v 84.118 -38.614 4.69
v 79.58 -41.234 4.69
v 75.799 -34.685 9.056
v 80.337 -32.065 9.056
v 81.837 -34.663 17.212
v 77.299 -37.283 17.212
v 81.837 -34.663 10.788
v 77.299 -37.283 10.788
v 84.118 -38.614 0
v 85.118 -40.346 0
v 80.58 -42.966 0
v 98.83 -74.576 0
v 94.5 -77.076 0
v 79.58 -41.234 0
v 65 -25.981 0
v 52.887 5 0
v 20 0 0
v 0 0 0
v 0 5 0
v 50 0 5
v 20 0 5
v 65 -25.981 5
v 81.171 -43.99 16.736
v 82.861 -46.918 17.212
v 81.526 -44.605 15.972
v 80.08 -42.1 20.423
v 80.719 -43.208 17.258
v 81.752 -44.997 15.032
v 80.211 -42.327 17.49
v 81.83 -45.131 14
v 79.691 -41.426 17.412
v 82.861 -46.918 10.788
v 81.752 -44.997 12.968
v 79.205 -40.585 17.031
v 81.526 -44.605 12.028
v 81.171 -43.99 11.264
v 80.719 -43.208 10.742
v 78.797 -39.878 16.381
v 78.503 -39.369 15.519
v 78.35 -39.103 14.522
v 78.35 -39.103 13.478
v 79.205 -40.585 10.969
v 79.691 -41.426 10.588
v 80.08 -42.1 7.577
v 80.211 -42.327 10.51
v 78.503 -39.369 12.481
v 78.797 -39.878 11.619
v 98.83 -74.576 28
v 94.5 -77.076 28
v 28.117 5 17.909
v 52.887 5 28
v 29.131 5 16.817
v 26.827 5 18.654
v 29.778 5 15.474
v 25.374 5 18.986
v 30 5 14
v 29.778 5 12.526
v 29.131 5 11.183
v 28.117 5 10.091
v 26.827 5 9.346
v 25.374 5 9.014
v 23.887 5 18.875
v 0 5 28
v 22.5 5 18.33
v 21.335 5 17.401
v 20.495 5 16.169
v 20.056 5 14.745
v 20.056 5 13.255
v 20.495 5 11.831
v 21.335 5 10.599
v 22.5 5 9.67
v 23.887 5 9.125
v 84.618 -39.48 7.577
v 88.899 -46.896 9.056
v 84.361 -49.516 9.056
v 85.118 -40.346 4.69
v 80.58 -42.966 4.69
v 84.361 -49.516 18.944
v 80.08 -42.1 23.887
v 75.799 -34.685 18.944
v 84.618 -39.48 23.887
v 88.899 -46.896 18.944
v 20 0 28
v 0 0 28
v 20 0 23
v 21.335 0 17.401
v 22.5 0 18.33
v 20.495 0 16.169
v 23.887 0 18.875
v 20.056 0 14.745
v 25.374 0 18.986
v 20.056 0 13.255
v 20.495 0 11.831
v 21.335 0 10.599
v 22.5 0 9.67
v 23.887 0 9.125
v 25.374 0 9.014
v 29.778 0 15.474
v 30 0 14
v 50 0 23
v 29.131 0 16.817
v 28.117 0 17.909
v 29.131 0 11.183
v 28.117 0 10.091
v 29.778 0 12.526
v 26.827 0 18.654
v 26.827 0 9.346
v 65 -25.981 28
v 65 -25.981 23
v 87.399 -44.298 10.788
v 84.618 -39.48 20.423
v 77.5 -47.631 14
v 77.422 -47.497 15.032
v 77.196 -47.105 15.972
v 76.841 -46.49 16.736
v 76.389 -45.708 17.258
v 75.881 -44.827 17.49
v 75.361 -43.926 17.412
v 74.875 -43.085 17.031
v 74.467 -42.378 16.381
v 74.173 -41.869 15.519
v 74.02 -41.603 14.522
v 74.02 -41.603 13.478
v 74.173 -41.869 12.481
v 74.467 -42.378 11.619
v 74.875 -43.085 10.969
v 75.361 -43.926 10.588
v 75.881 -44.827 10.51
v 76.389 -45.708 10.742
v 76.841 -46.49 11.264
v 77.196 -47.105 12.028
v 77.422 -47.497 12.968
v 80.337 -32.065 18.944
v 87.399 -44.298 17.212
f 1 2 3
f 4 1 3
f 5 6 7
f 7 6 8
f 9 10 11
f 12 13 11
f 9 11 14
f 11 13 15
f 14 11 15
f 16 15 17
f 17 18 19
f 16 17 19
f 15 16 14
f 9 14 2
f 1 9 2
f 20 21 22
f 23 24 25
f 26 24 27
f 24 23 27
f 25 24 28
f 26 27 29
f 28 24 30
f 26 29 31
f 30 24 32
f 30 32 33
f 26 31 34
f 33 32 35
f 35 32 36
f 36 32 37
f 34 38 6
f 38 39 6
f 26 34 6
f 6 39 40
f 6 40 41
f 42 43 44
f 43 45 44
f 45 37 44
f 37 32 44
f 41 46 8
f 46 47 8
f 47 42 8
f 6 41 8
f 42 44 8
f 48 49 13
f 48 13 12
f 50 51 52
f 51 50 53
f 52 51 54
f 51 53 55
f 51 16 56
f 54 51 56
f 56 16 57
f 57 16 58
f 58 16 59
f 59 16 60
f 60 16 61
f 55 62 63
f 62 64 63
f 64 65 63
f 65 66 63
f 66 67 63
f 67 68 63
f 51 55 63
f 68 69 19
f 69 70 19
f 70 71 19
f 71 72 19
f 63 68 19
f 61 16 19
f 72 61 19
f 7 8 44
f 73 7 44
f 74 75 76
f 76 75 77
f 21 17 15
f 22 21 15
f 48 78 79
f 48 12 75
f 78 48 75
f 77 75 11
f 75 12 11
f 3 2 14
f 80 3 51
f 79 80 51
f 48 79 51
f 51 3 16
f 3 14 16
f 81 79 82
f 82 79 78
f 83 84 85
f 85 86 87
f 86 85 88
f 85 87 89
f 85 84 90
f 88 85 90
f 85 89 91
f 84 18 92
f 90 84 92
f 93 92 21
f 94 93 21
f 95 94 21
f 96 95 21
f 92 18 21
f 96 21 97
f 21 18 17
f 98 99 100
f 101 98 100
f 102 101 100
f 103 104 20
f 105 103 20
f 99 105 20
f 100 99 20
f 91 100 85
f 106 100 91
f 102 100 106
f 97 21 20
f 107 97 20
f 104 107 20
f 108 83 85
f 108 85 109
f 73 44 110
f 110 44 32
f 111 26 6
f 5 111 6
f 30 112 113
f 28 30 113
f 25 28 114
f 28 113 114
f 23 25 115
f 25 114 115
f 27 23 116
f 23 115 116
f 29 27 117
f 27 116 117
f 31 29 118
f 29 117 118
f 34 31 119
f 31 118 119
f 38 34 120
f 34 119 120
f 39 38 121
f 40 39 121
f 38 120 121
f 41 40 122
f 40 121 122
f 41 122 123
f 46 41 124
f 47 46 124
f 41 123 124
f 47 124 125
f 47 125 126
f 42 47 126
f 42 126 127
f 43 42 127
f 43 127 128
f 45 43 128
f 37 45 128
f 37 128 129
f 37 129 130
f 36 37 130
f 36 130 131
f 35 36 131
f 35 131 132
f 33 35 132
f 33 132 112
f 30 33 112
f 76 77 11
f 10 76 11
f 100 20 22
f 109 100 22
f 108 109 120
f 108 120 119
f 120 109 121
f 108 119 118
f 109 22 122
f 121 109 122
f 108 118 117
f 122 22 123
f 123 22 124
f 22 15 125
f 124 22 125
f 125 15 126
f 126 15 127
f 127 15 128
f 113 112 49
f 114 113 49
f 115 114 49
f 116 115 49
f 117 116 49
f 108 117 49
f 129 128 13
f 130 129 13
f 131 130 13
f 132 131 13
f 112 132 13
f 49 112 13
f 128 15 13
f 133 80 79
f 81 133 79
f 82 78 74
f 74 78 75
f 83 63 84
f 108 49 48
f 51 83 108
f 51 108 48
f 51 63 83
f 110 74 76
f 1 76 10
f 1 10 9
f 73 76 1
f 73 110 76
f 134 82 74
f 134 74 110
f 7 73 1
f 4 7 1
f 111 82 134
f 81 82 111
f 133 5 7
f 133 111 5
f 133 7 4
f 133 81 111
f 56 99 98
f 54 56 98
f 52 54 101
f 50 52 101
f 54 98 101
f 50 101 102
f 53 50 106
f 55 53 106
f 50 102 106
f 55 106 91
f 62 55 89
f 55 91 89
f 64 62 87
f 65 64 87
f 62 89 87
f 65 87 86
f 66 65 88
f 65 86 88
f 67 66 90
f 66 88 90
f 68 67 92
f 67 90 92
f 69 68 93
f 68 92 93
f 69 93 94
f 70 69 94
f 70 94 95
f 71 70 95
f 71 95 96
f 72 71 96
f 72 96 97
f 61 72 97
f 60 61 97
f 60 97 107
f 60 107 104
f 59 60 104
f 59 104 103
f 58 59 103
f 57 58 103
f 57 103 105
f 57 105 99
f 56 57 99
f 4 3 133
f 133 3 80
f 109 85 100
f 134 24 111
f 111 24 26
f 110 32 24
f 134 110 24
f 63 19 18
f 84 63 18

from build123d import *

# Parameters (mm, degrees)
F1_DEPTH  = 28
F2_R      = 5
F3_DEPTH  = 5.001
F4_R      = 3.5
F5_DEPTH  = 44.7891304684
F7_DEPTH  = 5
F9_DEPTH  = 5
F11_DEPTH = 5.24
F13_DEPTH = 5.24


with BuildPart() as f1:
    # F0 (on Top) → F1 (new body)
    with BuildSketch(Plane.XY):
        Polygon((52.8867513459, 5), (0, 5), (0, 0), (50, 0), (94.5, -77.0762609368), (98.8301270189, -74.5762609368), align=None)
    extrude(amount=F1_DEPTH)

    # F2 (on face) → F3 (cut, through all)
    with BuildSketch(Plane.XZ):
        with Locations((25, 14)):
            Circle(F2_R)
    extrude(amount=-F3_DEPTH, mode=Mode.SUBTRACT)

    # F4 (on face) → F5 (cut, through all)
    with BuildSketch(Plane(origin=(37.5, 21.6506350946, 0), x_dir=(0.5, -0.8660254038, 0), z_dir=(-0.8660254038, -0.5, 0))):
        with Locations((76.5, 14)):
            Circle(F4_R)
    extrude(amount=-F5_DEPTH, mode=Mode.SUBTRACT)

    # F6 (on Top) → F7 (join)
    with BuildSketch(Plane.XY):
        Polygon((50, 0), (20, 0), (65, -25.9807621135), align=None)
    extrude(amount=F7_DEPTH)

    # F8 (on face) → F9 (join)
    with BuildSketch(Plane.XY.offset(28)):
        Polygon((65, -25.9807621135), (50, 0), (20, 0), align=None)
    extrude(amount=-F9_DEPTH)

    # F10 (on face) → F11 (join)
    with BuildSketch(Plane(origin=(41.8301270189, 24.1506350946, 0), x_dir=(-0.5, 0.8660254038, 0), z_dir=(0.8660254038, 0.5, 0))):
        Polygon((-85.0626, 18.943619415), (-85.0626, 9.056380585), (-76.5, 4.1127611701), (-67.9374, 9.056380585), (-67.9374, 18.943619415), (-76.5, 23.8872388299), align=None)
        Polygon((-76.5, 20.4231372148), (-70.9374, 17.2115686074), (-70.9374, 10.7884313926), (-76.5, 7.5768627852), (-82.0626, 10.7884313926), (-82.0626, 17.2115686074), align=None, mode=Mode.SUBTRACT)
    extrude(amount=F11_DEPTH)

    # F12 (on face) → F13 (join, through all)
    with BuildSketch(Plane(origin=(41.8301270189, 24.1506350946, 0), x_dir=(-0.5, 0.8660254038, 0), z_dir=(0.8660254038, 0.5, 0))):
        Polygon((-75.5, 0), (-75.5, 4.6901114393), (-76.5, 4.1127611701), (-77.5, 4.6901114393), (-77.5, 0), align=None)
    extrude(amount=F13_DEPTH)


solid = f1.part
